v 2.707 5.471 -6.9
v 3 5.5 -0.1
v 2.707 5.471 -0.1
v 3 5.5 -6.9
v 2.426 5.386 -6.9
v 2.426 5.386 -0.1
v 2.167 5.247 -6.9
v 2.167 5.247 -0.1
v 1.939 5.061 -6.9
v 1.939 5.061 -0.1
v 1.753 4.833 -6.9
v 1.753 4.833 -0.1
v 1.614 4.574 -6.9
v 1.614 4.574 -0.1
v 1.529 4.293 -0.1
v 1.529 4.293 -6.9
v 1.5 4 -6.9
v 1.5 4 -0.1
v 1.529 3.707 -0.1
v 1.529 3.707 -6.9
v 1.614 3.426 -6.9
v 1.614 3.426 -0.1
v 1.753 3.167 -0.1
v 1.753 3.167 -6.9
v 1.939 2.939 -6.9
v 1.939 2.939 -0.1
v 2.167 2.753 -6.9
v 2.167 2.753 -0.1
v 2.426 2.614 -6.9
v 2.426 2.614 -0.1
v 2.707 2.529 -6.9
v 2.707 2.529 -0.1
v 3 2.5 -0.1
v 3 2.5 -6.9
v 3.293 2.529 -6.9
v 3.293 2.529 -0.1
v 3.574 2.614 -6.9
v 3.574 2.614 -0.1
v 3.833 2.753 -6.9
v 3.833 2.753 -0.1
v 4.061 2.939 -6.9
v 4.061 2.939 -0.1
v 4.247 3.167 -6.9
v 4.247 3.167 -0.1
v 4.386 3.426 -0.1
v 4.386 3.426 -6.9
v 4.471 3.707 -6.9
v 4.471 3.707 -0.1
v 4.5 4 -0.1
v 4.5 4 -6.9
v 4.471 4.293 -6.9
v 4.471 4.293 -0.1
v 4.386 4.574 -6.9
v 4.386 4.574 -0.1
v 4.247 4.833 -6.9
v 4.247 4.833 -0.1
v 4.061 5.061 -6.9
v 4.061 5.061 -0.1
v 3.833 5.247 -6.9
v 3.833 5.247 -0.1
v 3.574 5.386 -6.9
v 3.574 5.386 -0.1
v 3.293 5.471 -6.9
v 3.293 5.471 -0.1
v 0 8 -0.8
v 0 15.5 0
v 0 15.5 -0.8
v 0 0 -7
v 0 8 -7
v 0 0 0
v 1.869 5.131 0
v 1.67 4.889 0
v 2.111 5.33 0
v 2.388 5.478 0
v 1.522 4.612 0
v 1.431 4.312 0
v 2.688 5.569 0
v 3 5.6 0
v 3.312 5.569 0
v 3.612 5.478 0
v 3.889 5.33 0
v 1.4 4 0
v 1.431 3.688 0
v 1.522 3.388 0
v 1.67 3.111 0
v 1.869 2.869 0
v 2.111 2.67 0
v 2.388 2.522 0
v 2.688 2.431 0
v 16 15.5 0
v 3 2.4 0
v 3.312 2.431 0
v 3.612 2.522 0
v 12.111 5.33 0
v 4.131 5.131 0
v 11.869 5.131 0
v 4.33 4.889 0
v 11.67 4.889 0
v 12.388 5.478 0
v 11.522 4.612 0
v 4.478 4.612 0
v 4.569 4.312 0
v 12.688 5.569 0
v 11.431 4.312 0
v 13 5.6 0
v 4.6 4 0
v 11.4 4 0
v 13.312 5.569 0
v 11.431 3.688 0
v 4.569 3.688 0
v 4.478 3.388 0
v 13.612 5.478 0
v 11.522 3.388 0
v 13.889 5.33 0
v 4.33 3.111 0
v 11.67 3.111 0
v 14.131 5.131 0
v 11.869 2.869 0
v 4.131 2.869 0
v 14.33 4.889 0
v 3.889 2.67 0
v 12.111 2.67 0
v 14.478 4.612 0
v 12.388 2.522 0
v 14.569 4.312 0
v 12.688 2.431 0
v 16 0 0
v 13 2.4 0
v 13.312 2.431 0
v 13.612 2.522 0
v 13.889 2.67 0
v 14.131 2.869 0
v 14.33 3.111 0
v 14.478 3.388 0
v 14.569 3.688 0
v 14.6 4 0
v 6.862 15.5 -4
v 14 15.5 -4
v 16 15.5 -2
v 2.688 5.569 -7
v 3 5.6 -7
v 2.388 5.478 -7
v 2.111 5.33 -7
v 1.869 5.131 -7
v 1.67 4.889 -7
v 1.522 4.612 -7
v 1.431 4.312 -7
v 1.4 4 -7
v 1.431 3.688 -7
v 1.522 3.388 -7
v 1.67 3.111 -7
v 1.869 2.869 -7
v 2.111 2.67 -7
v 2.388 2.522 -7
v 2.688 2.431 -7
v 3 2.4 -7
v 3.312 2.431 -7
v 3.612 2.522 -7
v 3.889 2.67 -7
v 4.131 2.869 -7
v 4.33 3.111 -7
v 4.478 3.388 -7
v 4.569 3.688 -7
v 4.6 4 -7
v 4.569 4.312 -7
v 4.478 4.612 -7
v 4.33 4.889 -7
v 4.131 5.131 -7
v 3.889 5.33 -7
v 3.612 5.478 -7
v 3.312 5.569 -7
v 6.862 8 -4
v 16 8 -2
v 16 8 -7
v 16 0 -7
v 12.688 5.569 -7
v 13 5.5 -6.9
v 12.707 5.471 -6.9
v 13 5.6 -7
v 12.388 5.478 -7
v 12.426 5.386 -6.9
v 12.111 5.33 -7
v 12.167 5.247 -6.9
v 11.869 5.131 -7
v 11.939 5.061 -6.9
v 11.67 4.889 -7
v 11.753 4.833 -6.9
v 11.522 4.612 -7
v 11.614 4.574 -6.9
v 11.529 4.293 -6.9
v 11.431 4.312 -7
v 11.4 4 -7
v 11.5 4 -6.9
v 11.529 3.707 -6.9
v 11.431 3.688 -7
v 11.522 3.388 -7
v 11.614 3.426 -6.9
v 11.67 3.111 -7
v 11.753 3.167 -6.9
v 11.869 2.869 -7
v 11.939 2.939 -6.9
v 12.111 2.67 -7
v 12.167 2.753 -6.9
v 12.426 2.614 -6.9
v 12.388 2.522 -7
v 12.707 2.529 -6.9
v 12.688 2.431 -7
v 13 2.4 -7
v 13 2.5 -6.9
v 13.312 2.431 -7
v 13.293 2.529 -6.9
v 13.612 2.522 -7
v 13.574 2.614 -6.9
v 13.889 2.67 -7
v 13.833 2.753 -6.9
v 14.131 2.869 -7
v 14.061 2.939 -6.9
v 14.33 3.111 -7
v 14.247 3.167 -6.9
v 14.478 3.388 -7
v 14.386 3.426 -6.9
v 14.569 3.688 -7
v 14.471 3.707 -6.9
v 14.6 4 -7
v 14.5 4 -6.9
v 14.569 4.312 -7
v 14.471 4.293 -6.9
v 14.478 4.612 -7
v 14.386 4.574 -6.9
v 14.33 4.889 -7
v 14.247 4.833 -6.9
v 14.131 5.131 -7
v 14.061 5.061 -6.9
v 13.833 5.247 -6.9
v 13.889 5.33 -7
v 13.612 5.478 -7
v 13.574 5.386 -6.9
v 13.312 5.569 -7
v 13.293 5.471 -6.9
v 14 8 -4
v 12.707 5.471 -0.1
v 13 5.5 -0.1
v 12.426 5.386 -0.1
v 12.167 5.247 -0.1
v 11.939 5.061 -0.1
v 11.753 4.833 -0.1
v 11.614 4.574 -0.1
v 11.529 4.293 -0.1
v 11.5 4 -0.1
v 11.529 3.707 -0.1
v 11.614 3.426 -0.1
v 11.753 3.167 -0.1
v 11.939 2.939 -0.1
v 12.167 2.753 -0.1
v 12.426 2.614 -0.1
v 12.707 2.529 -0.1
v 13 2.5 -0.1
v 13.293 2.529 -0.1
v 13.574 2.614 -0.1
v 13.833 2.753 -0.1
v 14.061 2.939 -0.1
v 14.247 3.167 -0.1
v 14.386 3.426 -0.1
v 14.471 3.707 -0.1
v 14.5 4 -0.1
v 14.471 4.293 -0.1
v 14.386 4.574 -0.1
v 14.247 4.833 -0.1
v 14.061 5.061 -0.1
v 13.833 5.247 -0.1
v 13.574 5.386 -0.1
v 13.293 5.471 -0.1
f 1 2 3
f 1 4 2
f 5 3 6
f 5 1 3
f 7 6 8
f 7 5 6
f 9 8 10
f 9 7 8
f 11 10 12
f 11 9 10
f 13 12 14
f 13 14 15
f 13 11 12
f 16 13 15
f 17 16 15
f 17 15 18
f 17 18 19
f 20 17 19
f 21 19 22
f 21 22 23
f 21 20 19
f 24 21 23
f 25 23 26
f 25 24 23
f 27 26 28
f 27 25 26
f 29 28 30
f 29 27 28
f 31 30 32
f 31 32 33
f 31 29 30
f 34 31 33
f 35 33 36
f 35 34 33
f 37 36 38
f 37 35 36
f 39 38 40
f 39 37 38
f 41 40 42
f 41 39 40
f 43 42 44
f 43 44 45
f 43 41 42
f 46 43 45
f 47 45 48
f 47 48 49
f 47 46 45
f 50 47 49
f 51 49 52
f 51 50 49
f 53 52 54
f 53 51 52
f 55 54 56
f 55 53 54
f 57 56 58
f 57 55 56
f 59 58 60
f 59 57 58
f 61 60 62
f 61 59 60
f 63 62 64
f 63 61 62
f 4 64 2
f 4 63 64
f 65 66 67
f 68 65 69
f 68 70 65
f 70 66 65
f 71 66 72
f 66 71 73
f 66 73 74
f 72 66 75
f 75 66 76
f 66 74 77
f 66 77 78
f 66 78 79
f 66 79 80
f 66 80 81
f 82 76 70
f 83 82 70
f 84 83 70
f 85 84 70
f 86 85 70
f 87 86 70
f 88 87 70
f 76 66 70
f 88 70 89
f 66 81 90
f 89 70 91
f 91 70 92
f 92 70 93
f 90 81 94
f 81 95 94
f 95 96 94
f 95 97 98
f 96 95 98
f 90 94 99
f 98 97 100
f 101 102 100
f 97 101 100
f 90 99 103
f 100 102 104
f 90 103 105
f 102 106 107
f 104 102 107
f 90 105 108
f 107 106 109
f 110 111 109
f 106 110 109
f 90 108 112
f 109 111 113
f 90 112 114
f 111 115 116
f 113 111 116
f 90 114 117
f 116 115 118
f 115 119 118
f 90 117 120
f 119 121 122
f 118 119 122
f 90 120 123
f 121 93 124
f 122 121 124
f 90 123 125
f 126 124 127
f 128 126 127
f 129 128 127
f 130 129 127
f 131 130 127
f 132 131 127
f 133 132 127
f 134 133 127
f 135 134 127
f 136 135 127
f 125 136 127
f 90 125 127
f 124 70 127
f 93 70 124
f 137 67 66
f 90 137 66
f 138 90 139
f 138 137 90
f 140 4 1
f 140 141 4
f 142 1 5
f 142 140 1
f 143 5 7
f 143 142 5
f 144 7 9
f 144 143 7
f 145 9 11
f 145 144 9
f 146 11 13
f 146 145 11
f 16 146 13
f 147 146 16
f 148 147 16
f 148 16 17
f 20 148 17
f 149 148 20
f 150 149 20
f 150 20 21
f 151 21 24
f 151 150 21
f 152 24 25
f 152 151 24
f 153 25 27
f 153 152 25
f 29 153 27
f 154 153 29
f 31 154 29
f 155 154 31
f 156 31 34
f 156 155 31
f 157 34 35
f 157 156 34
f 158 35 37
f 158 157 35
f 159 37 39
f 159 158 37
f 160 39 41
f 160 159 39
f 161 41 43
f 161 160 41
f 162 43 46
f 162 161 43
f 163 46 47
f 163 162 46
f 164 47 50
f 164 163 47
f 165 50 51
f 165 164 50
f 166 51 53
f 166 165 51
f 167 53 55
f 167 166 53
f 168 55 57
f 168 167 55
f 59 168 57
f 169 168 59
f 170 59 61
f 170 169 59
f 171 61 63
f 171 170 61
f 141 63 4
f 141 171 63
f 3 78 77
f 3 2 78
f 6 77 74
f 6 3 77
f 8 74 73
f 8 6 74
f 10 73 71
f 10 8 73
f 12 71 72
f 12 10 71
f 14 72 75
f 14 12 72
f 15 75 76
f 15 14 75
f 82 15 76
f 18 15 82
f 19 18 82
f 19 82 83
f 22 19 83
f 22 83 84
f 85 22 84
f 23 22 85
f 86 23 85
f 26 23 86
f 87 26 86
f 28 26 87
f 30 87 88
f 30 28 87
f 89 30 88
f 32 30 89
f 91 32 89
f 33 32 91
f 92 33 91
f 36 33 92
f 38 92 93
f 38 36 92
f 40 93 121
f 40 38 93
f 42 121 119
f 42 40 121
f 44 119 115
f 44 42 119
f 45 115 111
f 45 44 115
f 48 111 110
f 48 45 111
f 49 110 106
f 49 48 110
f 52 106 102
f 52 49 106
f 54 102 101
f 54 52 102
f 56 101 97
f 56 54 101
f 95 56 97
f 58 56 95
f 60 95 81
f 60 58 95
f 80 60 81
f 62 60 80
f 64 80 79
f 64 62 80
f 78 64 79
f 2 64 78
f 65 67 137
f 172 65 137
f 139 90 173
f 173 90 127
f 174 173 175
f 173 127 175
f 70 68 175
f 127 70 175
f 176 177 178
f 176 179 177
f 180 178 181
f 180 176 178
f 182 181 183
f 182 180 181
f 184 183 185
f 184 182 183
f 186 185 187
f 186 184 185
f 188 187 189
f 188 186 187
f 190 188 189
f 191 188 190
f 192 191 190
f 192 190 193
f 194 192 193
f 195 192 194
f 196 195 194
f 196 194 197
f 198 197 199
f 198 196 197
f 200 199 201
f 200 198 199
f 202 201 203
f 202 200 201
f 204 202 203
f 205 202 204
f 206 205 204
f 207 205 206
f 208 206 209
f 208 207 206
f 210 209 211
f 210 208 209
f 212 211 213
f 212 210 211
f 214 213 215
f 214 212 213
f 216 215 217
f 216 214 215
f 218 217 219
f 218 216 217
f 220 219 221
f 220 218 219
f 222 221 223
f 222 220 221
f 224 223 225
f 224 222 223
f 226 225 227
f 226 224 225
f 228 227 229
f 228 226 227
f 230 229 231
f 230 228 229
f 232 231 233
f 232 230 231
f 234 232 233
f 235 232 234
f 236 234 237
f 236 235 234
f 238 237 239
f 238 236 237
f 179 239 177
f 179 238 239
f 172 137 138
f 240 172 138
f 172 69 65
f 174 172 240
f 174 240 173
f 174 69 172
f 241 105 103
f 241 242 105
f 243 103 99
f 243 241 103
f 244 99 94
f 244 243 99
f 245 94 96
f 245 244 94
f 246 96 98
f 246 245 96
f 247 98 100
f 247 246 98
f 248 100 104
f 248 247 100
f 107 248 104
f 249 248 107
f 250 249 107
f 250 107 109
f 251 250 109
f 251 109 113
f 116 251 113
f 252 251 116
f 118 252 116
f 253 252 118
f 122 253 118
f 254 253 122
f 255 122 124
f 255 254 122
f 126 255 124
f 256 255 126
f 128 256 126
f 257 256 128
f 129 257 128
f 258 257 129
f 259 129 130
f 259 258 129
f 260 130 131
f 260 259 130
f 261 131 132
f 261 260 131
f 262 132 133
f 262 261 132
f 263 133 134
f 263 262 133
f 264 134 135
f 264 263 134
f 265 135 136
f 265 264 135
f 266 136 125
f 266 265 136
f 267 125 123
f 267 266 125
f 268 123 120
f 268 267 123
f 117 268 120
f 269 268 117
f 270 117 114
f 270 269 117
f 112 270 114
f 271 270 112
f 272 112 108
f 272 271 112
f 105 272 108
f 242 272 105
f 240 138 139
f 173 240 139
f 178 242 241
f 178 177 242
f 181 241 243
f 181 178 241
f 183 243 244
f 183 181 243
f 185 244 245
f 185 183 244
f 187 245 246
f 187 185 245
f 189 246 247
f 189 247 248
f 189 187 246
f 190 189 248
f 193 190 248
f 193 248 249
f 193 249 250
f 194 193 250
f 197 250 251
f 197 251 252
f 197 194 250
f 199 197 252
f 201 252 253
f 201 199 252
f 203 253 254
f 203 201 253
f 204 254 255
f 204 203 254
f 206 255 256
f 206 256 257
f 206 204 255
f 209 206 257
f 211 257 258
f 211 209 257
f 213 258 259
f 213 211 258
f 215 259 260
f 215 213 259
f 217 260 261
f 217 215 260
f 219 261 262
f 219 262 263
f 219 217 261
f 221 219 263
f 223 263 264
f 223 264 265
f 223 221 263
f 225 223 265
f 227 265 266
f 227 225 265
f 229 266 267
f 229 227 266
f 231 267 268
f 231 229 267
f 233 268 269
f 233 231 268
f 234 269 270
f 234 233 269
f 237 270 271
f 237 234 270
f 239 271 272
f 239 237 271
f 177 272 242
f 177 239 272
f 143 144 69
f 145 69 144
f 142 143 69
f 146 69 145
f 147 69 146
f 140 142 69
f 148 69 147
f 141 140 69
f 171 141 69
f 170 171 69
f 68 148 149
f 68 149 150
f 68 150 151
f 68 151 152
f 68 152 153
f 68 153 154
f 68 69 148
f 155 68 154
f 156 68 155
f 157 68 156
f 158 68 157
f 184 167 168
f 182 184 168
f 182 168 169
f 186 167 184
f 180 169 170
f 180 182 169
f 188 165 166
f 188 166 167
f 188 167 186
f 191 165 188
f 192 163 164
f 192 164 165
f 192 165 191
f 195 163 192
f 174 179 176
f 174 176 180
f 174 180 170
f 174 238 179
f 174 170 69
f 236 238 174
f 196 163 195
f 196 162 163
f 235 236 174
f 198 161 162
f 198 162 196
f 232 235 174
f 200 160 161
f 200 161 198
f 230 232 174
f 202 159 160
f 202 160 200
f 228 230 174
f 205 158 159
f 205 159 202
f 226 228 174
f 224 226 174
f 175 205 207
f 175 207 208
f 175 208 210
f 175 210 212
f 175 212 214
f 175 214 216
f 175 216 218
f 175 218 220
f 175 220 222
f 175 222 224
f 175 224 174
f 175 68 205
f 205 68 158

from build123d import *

# Parameters (mm, degrees)
SKETCH_1_W          = 16
SKETCH_1_H          = 7
EXTRUDE_1_DEPTH     = 15.5
CUT_EXTRUDE_1_DEPTH = 7.5
M3X0_51_AT_2_COUNT  = 2
M3X0_51_AT_2_PITCH  = 10


with BuildPart() as part:
    # Эскиз1 → Бобышка-Вытянуть1 (new body)
    with BuildSketch(Plane(origin=(0, 0, 0), x_dir=(1, 0, 0), z_dir=(0, 1, 0))):
        with Locations((8, 3.5)):
            Rectangle(SKETCH_1_W, SKETCH_1_H)
    extrude(amount=EXTRUDE_1_DEPTH)

    # Эскиз2 → Вырез-Вытянуть1 (cut)
    with BuildSketch(Plane(origin=(0, 15.5, 0), x_dir=(1, 0, 0), z_dir=(0, 1, 0))):
        Polygon((-40.166209025, -17.929810867), (0, 0.8), (6.862422146, 4), (14, 4), (16, 2), (47.337917628, -29.337917628), (58.796749642, 58.555289271), (-28.70737701, 69.963396032), align=None)
    extrude(amount=-CUT_EXTRUDE_1_DEPTH, mode=Mode.SUBTRACT)

    # Эскиз3 → Отверстие обработанное метчиком M3x0.51 (revolve, cut)
    with BuildSketch(Plane(origin=(3, 4, -7), x_dir=(0, 1, 0), z_dir=(1, 0, 0))):
        Polygon((0, 0), (0, 7), (1.6, 7), (1.5, 6.9), (1.5, 0.1), (1.6, 0), align=None)
    m3x0_51 = revolve(axis=Axis((3, 4, -13.35), (0, 0, 1)), mode=Mode.SUBTRACT)

    # Отверстие обработанное метчиком M3x0.51 at 2: Отверстие обработанное метчиком M3x0.51 ×2
    with Locations(*[(i * M3X0_51_AT_2_PITCH, 0, 0) for i in range(1, M3X0_51_AT_2_COUNT)]):
        add(m3x0_51, mode=Mode.SUBTRACT)


solid = part.part
